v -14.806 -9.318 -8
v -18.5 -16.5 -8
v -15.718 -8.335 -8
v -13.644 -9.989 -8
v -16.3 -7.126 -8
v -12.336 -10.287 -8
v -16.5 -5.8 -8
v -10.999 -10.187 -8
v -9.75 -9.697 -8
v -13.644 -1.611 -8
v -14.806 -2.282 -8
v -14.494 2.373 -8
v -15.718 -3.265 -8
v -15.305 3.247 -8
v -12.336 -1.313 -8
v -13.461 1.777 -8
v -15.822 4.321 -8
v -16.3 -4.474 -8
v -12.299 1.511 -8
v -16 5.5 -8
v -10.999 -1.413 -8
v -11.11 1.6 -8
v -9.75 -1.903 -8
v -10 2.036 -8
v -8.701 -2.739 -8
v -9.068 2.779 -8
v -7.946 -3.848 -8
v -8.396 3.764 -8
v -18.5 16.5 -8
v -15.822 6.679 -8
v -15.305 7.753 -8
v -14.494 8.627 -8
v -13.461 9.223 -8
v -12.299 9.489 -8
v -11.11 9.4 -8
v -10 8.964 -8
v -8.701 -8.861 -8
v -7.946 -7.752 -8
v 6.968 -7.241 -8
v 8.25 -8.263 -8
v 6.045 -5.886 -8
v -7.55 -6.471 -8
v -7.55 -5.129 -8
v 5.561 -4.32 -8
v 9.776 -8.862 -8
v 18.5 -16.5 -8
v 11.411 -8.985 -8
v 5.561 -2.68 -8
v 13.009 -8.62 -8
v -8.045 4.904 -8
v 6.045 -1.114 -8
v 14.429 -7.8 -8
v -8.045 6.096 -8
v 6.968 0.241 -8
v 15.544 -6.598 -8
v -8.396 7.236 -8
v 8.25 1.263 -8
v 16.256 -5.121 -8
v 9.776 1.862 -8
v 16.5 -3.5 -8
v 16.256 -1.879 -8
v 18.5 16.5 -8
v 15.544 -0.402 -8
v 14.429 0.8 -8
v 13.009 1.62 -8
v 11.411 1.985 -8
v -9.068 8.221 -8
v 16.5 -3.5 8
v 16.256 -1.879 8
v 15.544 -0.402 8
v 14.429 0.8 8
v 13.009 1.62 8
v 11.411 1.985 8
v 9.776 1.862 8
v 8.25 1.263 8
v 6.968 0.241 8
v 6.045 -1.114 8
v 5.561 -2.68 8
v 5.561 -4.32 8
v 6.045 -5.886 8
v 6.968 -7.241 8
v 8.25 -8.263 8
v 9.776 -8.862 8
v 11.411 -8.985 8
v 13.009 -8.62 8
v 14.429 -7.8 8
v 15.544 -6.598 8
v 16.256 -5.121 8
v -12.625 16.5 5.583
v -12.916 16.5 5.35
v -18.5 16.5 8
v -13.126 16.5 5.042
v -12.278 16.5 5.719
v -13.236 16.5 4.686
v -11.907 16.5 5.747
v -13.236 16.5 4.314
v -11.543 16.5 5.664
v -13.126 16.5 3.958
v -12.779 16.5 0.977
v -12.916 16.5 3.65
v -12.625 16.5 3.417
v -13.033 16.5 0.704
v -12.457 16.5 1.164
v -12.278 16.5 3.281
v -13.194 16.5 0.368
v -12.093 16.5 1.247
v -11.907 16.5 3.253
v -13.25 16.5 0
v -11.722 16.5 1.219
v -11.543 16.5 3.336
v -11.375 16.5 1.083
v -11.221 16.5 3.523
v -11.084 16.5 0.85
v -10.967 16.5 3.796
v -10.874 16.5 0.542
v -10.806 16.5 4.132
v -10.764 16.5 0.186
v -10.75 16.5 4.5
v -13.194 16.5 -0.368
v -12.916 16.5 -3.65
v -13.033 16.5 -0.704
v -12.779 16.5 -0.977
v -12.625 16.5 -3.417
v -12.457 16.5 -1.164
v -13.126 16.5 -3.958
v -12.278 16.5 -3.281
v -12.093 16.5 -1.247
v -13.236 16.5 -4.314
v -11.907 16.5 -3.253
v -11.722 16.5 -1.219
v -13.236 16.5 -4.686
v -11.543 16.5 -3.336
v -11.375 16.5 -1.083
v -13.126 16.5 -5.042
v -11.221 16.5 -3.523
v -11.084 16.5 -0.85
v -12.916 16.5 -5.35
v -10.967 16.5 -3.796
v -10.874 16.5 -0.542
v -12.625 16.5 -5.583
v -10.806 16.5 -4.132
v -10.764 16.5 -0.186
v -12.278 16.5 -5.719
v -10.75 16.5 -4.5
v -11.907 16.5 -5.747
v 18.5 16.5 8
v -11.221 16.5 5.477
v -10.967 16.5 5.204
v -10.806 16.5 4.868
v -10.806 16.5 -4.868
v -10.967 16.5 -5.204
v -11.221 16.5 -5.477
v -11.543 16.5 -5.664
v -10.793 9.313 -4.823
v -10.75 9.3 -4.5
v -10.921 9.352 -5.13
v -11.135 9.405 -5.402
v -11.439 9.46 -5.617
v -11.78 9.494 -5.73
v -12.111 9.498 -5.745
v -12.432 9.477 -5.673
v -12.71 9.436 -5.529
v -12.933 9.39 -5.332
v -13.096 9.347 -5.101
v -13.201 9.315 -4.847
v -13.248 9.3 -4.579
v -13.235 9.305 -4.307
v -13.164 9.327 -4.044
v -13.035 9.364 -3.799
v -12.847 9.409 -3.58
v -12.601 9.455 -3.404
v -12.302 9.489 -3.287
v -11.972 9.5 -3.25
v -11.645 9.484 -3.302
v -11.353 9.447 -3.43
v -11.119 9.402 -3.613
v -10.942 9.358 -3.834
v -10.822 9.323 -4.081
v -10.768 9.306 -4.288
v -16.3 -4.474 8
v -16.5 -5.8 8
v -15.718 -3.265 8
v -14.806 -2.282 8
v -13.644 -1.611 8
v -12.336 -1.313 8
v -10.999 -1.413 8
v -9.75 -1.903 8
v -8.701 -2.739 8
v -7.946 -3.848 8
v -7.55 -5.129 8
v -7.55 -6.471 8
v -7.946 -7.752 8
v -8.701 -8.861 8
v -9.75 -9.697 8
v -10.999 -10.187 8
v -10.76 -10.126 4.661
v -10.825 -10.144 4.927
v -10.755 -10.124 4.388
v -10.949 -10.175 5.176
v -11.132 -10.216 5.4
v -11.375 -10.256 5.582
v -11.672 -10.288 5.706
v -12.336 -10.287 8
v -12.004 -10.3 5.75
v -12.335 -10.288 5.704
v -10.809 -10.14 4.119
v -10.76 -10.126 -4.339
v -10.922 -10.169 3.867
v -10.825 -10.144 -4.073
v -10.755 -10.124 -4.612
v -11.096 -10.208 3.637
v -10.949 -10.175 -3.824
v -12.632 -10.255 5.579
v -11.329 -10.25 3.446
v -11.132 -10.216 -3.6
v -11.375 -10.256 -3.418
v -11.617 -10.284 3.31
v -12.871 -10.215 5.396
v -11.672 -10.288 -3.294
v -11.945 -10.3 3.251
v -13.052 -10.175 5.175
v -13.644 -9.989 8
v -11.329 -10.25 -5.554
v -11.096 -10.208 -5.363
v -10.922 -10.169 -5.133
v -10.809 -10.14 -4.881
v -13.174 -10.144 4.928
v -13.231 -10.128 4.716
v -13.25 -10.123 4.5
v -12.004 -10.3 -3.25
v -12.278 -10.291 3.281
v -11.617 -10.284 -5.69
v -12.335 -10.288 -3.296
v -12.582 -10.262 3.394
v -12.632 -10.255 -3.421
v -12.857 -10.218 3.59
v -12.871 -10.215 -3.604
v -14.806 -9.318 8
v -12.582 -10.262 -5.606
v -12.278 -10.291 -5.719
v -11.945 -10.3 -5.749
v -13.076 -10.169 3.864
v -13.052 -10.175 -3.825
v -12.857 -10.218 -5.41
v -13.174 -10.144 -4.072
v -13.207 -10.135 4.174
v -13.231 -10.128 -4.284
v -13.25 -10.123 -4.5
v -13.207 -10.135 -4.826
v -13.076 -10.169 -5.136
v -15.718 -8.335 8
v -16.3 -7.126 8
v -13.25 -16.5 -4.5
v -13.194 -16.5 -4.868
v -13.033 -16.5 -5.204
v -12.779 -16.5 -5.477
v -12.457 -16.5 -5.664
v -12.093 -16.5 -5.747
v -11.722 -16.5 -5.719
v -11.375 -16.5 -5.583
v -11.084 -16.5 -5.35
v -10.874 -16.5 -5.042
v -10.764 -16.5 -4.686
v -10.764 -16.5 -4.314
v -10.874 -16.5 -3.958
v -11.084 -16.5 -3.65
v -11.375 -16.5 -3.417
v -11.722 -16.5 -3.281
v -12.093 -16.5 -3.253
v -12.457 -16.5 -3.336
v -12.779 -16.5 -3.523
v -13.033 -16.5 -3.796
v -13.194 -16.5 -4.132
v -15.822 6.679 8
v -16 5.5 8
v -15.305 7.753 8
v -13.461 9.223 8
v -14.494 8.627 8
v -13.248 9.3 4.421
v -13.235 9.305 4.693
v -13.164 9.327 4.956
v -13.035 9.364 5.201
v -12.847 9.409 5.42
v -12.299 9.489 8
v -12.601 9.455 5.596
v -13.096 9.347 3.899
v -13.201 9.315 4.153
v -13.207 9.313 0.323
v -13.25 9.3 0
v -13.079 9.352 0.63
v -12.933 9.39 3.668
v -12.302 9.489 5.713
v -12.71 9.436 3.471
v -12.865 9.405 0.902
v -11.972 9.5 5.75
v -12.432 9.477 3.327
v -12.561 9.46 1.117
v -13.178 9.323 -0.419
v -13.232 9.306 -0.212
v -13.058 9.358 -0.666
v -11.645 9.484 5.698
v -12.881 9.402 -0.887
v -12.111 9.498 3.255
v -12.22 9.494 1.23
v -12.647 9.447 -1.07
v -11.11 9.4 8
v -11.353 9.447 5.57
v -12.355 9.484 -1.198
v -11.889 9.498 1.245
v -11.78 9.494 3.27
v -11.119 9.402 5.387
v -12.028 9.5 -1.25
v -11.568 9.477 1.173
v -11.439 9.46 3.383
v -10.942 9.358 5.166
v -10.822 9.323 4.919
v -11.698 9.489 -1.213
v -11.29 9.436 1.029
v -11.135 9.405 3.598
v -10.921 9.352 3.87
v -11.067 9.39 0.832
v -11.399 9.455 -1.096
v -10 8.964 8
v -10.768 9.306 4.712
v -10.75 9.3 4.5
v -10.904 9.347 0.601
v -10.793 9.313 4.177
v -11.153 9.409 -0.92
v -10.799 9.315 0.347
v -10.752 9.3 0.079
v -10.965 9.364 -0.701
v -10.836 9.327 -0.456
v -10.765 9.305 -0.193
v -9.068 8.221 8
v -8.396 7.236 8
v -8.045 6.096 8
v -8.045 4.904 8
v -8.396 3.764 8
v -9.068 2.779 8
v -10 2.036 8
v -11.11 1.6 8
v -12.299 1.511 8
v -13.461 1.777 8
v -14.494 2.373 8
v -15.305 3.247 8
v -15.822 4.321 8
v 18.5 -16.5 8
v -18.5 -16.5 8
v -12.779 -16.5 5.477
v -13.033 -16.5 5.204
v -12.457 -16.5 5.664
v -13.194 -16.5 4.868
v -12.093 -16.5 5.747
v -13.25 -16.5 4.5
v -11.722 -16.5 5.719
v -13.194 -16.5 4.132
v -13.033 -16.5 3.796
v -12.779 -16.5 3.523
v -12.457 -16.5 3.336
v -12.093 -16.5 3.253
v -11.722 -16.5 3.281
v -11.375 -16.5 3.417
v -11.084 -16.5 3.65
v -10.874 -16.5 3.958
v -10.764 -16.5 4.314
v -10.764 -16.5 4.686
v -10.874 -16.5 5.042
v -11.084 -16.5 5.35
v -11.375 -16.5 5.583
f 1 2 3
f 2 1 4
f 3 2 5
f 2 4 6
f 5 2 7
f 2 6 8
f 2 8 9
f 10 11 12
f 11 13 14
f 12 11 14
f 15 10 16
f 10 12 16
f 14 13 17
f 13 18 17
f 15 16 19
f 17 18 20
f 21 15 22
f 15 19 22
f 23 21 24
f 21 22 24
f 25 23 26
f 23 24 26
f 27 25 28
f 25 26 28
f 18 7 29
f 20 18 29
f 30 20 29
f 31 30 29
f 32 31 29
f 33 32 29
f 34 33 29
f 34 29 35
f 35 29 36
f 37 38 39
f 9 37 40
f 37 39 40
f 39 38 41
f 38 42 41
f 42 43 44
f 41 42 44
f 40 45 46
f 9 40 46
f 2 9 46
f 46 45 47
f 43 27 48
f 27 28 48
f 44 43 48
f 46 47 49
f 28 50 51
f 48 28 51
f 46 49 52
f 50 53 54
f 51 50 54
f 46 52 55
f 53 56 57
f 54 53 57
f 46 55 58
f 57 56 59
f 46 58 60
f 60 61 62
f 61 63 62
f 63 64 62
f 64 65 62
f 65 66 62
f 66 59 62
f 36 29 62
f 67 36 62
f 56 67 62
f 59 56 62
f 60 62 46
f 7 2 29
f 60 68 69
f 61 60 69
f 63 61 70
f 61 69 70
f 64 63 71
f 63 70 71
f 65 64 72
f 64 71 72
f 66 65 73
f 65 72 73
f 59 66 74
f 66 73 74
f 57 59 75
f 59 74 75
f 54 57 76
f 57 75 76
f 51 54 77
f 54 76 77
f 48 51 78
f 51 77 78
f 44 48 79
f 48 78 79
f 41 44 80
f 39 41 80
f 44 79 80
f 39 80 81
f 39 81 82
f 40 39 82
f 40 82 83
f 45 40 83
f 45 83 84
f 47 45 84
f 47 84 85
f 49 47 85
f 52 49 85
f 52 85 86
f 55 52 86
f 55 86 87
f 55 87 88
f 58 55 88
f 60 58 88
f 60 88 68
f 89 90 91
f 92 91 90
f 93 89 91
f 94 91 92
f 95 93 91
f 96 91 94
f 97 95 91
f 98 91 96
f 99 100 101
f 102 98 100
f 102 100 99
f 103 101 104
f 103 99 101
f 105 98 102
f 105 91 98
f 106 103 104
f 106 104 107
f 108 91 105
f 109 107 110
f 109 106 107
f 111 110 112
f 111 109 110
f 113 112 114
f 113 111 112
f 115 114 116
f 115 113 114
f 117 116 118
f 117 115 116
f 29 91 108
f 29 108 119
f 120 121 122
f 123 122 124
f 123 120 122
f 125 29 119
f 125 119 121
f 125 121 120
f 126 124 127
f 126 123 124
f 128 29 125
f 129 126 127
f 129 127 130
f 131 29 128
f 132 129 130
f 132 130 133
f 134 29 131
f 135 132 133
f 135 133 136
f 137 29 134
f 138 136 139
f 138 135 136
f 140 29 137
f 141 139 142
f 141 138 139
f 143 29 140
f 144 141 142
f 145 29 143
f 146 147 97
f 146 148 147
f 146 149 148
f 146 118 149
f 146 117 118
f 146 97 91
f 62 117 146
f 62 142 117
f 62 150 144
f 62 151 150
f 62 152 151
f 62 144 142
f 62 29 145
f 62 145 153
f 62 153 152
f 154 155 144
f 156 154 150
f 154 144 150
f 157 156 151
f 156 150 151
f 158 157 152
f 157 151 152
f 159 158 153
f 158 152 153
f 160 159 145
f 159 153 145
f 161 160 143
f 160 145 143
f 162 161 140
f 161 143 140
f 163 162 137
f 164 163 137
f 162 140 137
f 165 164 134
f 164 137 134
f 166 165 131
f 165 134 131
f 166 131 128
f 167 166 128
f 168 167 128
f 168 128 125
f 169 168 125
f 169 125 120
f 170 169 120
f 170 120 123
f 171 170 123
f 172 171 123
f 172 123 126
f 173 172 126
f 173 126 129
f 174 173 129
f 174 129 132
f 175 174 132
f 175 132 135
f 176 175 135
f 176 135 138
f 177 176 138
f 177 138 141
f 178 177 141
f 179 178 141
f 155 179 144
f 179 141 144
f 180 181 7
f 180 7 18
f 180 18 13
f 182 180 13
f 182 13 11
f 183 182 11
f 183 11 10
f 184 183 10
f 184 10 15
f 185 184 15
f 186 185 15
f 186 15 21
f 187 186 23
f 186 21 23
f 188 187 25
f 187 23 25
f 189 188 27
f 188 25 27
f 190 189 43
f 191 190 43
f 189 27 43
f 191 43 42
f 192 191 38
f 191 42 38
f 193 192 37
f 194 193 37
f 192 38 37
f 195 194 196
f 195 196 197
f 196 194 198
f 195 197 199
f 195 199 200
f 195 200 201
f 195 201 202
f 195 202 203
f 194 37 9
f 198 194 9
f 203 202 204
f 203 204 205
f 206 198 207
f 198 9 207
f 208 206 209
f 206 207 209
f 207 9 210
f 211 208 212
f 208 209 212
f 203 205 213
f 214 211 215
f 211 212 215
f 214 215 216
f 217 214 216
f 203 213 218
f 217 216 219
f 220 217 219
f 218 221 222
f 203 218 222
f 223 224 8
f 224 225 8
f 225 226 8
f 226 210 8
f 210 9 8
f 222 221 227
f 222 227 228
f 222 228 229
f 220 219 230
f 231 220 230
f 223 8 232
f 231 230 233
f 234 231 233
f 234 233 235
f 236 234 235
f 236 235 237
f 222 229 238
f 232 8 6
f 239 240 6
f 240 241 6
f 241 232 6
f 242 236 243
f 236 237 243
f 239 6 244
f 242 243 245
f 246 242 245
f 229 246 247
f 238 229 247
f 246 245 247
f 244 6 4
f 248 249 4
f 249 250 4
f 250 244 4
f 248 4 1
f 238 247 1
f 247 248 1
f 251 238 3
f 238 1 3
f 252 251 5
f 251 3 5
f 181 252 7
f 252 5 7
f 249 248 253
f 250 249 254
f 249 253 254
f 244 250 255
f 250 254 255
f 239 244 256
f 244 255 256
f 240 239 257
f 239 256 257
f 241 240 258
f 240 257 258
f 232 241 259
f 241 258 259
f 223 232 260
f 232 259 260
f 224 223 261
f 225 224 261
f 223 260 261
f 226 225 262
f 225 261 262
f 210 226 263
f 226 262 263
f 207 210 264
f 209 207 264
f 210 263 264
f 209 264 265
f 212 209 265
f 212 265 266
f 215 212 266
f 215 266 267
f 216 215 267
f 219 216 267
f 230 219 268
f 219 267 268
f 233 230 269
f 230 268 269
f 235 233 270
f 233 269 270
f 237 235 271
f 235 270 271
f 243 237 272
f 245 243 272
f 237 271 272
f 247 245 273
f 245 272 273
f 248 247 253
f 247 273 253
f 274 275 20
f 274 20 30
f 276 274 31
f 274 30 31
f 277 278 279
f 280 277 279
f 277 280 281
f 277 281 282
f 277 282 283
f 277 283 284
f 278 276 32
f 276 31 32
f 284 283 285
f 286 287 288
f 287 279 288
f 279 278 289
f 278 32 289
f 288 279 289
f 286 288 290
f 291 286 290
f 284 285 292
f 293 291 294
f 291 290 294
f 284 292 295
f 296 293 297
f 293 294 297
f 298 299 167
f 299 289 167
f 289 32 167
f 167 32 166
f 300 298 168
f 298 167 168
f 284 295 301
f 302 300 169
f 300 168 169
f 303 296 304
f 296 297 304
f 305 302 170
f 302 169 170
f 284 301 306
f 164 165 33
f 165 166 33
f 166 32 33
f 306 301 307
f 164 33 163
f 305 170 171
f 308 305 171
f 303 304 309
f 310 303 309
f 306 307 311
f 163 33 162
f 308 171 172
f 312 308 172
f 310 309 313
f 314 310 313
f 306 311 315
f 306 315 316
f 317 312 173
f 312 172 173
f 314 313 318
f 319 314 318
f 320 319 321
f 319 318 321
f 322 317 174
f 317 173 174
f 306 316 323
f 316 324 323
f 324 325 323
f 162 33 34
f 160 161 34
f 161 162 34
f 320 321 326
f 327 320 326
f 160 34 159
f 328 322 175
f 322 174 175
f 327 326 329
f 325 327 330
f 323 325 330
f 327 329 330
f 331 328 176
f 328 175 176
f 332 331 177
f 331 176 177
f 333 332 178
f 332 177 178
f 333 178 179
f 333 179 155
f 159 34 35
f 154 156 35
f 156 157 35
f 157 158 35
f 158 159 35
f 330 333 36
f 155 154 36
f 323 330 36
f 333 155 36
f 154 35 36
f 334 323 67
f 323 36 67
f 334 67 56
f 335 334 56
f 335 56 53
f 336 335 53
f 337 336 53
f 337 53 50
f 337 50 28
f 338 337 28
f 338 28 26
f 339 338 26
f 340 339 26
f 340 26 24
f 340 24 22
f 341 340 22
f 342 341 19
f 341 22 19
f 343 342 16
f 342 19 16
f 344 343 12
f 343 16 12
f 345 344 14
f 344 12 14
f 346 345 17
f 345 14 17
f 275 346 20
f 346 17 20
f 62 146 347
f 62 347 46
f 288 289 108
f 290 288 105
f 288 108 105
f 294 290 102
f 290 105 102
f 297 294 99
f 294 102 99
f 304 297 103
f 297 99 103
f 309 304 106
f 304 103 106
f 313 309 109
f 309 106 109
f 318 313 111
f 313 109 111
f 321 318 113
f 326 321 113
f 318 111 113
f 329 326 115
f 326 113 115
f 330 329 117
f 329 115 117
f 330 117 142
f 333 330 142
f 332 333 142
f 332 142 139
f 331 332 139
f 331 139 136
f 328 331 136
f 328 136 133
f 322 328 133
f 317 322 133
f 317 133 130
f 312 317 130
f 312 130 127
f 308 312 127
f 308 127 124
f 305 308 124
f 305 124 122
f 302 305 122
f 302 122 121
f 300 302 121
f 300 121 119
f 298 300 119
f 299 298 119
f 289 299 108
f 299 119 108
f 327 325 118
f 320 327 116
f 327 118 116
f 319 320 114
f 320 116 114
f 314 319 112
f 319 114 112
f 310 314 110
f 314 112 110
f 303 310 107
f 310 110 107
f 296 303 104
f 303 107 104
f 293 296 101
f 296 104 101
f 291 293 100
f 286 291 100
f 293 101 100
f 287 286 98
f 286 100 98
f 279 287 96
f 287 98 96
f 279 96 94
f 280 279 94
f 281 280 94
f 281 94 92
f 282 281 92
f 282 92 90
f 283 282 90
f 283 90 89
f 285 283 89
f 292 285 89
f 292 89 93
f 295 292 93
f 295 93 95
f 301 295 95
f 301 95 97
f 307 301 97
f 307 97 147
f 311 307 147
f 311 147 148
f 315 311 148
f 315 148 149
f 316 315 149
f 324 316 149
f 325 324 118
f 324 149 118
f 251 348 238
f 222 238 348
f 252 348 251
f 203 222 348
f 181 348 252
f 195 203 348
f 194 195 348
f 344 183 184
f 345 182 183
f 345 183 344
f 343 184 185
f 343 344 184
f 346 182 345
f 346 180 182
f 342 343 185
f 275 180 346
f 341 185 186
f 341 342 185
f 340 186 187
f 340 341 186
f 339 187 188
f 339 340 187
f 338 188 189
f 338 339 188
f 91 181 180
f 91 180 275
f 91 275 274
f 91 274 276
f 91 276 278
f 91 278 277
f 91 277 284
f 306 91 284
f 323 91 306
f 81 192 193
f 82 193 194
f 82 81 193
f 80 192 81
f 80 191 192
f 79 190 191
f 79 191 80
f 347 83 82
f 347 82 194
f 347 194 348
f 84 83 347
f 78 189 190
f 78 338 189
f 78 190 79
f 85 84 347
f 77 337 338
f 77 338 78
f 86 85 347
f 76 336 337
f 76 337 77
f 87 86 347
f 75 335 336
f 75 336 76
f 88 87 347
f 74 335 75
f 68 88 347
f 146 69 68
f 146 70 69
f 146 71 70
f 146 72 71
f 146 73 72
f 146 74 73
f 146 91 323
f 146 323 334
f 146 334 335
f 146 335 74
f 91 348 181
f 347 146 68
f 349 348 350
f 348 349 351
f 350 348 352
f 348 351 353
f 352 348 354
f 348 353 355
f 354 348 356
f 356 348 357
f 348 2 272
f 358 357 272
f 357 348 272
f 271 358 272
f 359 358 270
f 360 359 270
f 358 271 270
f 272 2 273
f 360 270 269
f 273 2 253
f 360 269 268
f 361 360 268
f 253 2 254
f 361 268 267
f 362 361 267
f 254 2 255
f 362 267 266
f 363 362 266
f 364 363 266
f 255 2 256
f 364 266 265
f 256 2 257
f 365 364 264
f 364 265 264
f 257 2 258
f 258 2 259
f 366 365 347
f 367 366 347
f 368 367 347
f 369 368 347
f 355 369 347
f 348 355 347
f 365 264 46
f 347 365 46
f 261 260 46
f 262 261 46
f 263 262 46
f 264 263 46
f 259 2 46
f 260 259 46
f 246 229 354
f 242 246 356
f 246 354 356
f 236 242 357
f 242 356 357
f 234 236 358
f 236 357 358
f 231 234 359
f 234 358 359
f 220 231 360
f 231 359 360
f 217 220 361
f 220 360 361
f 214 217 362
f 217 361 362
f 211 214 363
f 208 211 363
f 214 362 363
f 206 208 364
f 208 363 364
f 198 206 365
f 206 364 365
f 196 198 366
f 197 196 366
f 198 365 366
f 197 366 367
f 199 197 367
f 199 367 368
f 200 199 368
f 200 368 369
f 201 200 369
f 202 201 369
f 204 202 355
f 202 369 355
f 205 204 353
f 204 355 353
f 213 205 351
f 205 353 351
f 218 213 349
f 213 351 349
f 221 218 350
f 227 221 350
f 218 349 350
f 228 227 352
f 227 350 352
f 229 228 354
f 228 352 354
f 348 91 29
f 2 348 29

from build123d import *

# Parameters (mm, degrees)
ESQUISSE1_W             = 37
ESQUISSE1_H             = 16
BOSS_EXTRU_1_DEPTH      = 16.5
ESQUISSE3_R             = 5.5
ENL_V_MAT_EXTRU_2_DEPTH = 30.504236984
ESQUISSE14_R            = 4.5
ENL_V_MAT_EXTRU_3_DEPTH = 30.504236984
ESQUISSE15_R            = 4
ENL_V_MAT_EXTRU_4_DEPTH = 30.504236984
TROU_TARAUD_M34_REACH   = 40.668
TROU_TARAUD_M34_BORE_R  = 1.25
TROU_TARAUD_M35_REACH   = 40.668
TROU_TARAUD_M35_BORE_R  = 1.25
TROU_TARAUD_M36_REACH   = 41.444
TROU_TARAUD_M36_BORE_R  = 1.25


with BuildPart() as part:
    # Esquisse1 → Boss.-Extru.1 (new, symmetric)
    with BuildSketch(Plane(origin=(0, 0, 0), x_dir=(1, 0, 0), z_dir=(0, 1, 0))):
        Rectangle(ESQUISSE1_W, ESQUISSE1_H)
    extrude(amount=BOSS_EXTRU_1_DEPTH, both=True)

    # Esquisse3 → Enlèv. mat.-Extru.2 (cut, through all)
    with BuildSketch(Plane.XY.offset(8)):
        with Locations((11, -3.5)):
            Circle(ESQUISSE3_R)
    extrude(amount=-ENL_V_MAT_EXTRU_2_DEPTH, mode=Mode.SUBTRACT)

    # Esquisse14 → Enlèv. mat.-Extru.3 (cut, through all)
    with BuildSketch(Plane(origin=(0, 0, -8), x_dir=(-1, 0, 0), z_dir=(0, 0, -1))):
        with Locations((12, -5.8)):
            Circle(ESQUISSE14_R)
    extrude(amount=-ENL_V_MAT_EXTRU_3_DEPTH, mode=Mode.SUBTRACT)

    # Esquisse15 → Enlèv. mat.-Extru.4 (cut, through all)
    with BuildSketch(Plane(origin=(0, 0, -8), x_dir=(-1, 0, 0), z_dir=(0, 0, -1))):
        with Locations((12, 5.5)):
            Circle(ESQUISSE15_R)
    extrude(amount=-ENL_V_MAT_EXTRU_4_DEPTH, mode=Mode.SUBTRACT)

    # Trou taraudé M34 bore → Trou taraudé M34 (cut, up to next)
    with BuildSketch(Plane(origin=(0, 16.5, 0), x_dir=(1, 0, 0), z_dir=(0, 1, 0)), mode=Mode.PRIVATE) as trou_taraud_m34_sk1:
        with Locations((-12, -4.5)):
            Circle(TROU_TARAUD_M34_BORE_R)
    trou_taraud_m34_tool1 = extrude(trou_taraud_m34_sk1.sketch, amount=-TROU_TARAUD_M34_REACH, mode=Mode.PRIVATE) & part.part
    # Trou taraudé M34 bore → Trou taraudé M34 (cut, up to next)
    with BuildSketch(Plane(origin=(0, 16.5, 0), x_dir=(1, 0, 0), z_dir=(0, 1, 0)), mode=Mode.PRIVATE) as trou_taraud_m34_sk2:
        with Locations((-12, 4.5)):
            Circle(TROU_TARAUD_M34_BORE_R)
    trou_taraud_m34_tool2 = extrude(trou_taraud_m34_sk2.sketch, amount=-TROU_TARAUD_M34_REACH, mode=Mode.PRIVATE) & part.part
    add(trou_taraud_m34_tool1.solids().sort_by_distance((-12, 16.5, 4.5))[0], mode=Mode.SUBTRACT)
    add(trou_taraud_m34_tool2.solids().sort_by_distance((-12, 16.5, -4.5))[0], mode=Mode.SUBTRACT)

    # Trou taraudé M35 bore → Trou taraudé M35 (cut, up to next)
    with BuildSketch(Plane(origin=(0, -16.5, 0), x_dir=(-1, 0, 0), z_dir=(0, -1, 0)), mode=Mode.PRIVATE) as trou_taraud_m35_sk1:
        with Locations((12, -4.5)):
            Circle(TROU_TARAUD_M35_BORE_R)
    trou_taraud_m35_tool1 = extrude(trou_taraud_m35_sk1.sketch, amount=-TROU_TARAUD_M35_REACH, mode=Mode.PRIVATE) & part.part
    # Trou taraudé M35 bore → Trou taraudé M35 (cut, up to next)
    with BuildSketch(Plane(origin=(0, -16.5, 0), x_dir=(-1, 0, 0), z_dir=(0, -1, 0)), mode=Mode.PRIVATE) as trou_taraud_m35_sk2:
        with Locations((12, 4.5)):
            Circle(TROU_TARAUD_M35_BORE_R)
    trou_taraud_m35_tool2 = extrude(trou_taraud_m35_sk2.sketch, amount=-TROU_TARAUD_M35_REACH, mode=Mode.PRIVATE) & part.part
    add(trou_taraud_m35_tool1.solids().sort_by_distance((-12, -16.5, 4.5))[0], mode=Mode.SUBTRACT)
    add(trou_taraud_m35_tool2.solids().sort_by_distance((-12, -16.5, -4.5))[0], mode=Mode.SUBTRACT)

    # Trou taraudé M36 bore → Trou taraudé M36 (cut, up to next)
    with BuildSketch(Plane(origin=(-1.446004376, 16.5, -0.30351444), x_dir=(-1, 0, 0), z_dir=(0, 1, 0)), mode=Mode.PRIVATE) as trou_taraud_m36_sk1:
        with Locations((10.553995624, 0.30351444)):
            Circle(TROU_TARAUD_M36_BORE_R)
    trou_taraud_m36_tool1 = extrude(trou_taraud_m36_sk1.sketch, amount=-TROU_TARAUD_M36_REACH, mode=Mode.PRIVATE) & part.part
    add(trou_taraud_m36_tool1.solids().sort_by_distance((-12, 16.5, 0))[0], mode=Mode.SUBTRACT)


solid = part.part
